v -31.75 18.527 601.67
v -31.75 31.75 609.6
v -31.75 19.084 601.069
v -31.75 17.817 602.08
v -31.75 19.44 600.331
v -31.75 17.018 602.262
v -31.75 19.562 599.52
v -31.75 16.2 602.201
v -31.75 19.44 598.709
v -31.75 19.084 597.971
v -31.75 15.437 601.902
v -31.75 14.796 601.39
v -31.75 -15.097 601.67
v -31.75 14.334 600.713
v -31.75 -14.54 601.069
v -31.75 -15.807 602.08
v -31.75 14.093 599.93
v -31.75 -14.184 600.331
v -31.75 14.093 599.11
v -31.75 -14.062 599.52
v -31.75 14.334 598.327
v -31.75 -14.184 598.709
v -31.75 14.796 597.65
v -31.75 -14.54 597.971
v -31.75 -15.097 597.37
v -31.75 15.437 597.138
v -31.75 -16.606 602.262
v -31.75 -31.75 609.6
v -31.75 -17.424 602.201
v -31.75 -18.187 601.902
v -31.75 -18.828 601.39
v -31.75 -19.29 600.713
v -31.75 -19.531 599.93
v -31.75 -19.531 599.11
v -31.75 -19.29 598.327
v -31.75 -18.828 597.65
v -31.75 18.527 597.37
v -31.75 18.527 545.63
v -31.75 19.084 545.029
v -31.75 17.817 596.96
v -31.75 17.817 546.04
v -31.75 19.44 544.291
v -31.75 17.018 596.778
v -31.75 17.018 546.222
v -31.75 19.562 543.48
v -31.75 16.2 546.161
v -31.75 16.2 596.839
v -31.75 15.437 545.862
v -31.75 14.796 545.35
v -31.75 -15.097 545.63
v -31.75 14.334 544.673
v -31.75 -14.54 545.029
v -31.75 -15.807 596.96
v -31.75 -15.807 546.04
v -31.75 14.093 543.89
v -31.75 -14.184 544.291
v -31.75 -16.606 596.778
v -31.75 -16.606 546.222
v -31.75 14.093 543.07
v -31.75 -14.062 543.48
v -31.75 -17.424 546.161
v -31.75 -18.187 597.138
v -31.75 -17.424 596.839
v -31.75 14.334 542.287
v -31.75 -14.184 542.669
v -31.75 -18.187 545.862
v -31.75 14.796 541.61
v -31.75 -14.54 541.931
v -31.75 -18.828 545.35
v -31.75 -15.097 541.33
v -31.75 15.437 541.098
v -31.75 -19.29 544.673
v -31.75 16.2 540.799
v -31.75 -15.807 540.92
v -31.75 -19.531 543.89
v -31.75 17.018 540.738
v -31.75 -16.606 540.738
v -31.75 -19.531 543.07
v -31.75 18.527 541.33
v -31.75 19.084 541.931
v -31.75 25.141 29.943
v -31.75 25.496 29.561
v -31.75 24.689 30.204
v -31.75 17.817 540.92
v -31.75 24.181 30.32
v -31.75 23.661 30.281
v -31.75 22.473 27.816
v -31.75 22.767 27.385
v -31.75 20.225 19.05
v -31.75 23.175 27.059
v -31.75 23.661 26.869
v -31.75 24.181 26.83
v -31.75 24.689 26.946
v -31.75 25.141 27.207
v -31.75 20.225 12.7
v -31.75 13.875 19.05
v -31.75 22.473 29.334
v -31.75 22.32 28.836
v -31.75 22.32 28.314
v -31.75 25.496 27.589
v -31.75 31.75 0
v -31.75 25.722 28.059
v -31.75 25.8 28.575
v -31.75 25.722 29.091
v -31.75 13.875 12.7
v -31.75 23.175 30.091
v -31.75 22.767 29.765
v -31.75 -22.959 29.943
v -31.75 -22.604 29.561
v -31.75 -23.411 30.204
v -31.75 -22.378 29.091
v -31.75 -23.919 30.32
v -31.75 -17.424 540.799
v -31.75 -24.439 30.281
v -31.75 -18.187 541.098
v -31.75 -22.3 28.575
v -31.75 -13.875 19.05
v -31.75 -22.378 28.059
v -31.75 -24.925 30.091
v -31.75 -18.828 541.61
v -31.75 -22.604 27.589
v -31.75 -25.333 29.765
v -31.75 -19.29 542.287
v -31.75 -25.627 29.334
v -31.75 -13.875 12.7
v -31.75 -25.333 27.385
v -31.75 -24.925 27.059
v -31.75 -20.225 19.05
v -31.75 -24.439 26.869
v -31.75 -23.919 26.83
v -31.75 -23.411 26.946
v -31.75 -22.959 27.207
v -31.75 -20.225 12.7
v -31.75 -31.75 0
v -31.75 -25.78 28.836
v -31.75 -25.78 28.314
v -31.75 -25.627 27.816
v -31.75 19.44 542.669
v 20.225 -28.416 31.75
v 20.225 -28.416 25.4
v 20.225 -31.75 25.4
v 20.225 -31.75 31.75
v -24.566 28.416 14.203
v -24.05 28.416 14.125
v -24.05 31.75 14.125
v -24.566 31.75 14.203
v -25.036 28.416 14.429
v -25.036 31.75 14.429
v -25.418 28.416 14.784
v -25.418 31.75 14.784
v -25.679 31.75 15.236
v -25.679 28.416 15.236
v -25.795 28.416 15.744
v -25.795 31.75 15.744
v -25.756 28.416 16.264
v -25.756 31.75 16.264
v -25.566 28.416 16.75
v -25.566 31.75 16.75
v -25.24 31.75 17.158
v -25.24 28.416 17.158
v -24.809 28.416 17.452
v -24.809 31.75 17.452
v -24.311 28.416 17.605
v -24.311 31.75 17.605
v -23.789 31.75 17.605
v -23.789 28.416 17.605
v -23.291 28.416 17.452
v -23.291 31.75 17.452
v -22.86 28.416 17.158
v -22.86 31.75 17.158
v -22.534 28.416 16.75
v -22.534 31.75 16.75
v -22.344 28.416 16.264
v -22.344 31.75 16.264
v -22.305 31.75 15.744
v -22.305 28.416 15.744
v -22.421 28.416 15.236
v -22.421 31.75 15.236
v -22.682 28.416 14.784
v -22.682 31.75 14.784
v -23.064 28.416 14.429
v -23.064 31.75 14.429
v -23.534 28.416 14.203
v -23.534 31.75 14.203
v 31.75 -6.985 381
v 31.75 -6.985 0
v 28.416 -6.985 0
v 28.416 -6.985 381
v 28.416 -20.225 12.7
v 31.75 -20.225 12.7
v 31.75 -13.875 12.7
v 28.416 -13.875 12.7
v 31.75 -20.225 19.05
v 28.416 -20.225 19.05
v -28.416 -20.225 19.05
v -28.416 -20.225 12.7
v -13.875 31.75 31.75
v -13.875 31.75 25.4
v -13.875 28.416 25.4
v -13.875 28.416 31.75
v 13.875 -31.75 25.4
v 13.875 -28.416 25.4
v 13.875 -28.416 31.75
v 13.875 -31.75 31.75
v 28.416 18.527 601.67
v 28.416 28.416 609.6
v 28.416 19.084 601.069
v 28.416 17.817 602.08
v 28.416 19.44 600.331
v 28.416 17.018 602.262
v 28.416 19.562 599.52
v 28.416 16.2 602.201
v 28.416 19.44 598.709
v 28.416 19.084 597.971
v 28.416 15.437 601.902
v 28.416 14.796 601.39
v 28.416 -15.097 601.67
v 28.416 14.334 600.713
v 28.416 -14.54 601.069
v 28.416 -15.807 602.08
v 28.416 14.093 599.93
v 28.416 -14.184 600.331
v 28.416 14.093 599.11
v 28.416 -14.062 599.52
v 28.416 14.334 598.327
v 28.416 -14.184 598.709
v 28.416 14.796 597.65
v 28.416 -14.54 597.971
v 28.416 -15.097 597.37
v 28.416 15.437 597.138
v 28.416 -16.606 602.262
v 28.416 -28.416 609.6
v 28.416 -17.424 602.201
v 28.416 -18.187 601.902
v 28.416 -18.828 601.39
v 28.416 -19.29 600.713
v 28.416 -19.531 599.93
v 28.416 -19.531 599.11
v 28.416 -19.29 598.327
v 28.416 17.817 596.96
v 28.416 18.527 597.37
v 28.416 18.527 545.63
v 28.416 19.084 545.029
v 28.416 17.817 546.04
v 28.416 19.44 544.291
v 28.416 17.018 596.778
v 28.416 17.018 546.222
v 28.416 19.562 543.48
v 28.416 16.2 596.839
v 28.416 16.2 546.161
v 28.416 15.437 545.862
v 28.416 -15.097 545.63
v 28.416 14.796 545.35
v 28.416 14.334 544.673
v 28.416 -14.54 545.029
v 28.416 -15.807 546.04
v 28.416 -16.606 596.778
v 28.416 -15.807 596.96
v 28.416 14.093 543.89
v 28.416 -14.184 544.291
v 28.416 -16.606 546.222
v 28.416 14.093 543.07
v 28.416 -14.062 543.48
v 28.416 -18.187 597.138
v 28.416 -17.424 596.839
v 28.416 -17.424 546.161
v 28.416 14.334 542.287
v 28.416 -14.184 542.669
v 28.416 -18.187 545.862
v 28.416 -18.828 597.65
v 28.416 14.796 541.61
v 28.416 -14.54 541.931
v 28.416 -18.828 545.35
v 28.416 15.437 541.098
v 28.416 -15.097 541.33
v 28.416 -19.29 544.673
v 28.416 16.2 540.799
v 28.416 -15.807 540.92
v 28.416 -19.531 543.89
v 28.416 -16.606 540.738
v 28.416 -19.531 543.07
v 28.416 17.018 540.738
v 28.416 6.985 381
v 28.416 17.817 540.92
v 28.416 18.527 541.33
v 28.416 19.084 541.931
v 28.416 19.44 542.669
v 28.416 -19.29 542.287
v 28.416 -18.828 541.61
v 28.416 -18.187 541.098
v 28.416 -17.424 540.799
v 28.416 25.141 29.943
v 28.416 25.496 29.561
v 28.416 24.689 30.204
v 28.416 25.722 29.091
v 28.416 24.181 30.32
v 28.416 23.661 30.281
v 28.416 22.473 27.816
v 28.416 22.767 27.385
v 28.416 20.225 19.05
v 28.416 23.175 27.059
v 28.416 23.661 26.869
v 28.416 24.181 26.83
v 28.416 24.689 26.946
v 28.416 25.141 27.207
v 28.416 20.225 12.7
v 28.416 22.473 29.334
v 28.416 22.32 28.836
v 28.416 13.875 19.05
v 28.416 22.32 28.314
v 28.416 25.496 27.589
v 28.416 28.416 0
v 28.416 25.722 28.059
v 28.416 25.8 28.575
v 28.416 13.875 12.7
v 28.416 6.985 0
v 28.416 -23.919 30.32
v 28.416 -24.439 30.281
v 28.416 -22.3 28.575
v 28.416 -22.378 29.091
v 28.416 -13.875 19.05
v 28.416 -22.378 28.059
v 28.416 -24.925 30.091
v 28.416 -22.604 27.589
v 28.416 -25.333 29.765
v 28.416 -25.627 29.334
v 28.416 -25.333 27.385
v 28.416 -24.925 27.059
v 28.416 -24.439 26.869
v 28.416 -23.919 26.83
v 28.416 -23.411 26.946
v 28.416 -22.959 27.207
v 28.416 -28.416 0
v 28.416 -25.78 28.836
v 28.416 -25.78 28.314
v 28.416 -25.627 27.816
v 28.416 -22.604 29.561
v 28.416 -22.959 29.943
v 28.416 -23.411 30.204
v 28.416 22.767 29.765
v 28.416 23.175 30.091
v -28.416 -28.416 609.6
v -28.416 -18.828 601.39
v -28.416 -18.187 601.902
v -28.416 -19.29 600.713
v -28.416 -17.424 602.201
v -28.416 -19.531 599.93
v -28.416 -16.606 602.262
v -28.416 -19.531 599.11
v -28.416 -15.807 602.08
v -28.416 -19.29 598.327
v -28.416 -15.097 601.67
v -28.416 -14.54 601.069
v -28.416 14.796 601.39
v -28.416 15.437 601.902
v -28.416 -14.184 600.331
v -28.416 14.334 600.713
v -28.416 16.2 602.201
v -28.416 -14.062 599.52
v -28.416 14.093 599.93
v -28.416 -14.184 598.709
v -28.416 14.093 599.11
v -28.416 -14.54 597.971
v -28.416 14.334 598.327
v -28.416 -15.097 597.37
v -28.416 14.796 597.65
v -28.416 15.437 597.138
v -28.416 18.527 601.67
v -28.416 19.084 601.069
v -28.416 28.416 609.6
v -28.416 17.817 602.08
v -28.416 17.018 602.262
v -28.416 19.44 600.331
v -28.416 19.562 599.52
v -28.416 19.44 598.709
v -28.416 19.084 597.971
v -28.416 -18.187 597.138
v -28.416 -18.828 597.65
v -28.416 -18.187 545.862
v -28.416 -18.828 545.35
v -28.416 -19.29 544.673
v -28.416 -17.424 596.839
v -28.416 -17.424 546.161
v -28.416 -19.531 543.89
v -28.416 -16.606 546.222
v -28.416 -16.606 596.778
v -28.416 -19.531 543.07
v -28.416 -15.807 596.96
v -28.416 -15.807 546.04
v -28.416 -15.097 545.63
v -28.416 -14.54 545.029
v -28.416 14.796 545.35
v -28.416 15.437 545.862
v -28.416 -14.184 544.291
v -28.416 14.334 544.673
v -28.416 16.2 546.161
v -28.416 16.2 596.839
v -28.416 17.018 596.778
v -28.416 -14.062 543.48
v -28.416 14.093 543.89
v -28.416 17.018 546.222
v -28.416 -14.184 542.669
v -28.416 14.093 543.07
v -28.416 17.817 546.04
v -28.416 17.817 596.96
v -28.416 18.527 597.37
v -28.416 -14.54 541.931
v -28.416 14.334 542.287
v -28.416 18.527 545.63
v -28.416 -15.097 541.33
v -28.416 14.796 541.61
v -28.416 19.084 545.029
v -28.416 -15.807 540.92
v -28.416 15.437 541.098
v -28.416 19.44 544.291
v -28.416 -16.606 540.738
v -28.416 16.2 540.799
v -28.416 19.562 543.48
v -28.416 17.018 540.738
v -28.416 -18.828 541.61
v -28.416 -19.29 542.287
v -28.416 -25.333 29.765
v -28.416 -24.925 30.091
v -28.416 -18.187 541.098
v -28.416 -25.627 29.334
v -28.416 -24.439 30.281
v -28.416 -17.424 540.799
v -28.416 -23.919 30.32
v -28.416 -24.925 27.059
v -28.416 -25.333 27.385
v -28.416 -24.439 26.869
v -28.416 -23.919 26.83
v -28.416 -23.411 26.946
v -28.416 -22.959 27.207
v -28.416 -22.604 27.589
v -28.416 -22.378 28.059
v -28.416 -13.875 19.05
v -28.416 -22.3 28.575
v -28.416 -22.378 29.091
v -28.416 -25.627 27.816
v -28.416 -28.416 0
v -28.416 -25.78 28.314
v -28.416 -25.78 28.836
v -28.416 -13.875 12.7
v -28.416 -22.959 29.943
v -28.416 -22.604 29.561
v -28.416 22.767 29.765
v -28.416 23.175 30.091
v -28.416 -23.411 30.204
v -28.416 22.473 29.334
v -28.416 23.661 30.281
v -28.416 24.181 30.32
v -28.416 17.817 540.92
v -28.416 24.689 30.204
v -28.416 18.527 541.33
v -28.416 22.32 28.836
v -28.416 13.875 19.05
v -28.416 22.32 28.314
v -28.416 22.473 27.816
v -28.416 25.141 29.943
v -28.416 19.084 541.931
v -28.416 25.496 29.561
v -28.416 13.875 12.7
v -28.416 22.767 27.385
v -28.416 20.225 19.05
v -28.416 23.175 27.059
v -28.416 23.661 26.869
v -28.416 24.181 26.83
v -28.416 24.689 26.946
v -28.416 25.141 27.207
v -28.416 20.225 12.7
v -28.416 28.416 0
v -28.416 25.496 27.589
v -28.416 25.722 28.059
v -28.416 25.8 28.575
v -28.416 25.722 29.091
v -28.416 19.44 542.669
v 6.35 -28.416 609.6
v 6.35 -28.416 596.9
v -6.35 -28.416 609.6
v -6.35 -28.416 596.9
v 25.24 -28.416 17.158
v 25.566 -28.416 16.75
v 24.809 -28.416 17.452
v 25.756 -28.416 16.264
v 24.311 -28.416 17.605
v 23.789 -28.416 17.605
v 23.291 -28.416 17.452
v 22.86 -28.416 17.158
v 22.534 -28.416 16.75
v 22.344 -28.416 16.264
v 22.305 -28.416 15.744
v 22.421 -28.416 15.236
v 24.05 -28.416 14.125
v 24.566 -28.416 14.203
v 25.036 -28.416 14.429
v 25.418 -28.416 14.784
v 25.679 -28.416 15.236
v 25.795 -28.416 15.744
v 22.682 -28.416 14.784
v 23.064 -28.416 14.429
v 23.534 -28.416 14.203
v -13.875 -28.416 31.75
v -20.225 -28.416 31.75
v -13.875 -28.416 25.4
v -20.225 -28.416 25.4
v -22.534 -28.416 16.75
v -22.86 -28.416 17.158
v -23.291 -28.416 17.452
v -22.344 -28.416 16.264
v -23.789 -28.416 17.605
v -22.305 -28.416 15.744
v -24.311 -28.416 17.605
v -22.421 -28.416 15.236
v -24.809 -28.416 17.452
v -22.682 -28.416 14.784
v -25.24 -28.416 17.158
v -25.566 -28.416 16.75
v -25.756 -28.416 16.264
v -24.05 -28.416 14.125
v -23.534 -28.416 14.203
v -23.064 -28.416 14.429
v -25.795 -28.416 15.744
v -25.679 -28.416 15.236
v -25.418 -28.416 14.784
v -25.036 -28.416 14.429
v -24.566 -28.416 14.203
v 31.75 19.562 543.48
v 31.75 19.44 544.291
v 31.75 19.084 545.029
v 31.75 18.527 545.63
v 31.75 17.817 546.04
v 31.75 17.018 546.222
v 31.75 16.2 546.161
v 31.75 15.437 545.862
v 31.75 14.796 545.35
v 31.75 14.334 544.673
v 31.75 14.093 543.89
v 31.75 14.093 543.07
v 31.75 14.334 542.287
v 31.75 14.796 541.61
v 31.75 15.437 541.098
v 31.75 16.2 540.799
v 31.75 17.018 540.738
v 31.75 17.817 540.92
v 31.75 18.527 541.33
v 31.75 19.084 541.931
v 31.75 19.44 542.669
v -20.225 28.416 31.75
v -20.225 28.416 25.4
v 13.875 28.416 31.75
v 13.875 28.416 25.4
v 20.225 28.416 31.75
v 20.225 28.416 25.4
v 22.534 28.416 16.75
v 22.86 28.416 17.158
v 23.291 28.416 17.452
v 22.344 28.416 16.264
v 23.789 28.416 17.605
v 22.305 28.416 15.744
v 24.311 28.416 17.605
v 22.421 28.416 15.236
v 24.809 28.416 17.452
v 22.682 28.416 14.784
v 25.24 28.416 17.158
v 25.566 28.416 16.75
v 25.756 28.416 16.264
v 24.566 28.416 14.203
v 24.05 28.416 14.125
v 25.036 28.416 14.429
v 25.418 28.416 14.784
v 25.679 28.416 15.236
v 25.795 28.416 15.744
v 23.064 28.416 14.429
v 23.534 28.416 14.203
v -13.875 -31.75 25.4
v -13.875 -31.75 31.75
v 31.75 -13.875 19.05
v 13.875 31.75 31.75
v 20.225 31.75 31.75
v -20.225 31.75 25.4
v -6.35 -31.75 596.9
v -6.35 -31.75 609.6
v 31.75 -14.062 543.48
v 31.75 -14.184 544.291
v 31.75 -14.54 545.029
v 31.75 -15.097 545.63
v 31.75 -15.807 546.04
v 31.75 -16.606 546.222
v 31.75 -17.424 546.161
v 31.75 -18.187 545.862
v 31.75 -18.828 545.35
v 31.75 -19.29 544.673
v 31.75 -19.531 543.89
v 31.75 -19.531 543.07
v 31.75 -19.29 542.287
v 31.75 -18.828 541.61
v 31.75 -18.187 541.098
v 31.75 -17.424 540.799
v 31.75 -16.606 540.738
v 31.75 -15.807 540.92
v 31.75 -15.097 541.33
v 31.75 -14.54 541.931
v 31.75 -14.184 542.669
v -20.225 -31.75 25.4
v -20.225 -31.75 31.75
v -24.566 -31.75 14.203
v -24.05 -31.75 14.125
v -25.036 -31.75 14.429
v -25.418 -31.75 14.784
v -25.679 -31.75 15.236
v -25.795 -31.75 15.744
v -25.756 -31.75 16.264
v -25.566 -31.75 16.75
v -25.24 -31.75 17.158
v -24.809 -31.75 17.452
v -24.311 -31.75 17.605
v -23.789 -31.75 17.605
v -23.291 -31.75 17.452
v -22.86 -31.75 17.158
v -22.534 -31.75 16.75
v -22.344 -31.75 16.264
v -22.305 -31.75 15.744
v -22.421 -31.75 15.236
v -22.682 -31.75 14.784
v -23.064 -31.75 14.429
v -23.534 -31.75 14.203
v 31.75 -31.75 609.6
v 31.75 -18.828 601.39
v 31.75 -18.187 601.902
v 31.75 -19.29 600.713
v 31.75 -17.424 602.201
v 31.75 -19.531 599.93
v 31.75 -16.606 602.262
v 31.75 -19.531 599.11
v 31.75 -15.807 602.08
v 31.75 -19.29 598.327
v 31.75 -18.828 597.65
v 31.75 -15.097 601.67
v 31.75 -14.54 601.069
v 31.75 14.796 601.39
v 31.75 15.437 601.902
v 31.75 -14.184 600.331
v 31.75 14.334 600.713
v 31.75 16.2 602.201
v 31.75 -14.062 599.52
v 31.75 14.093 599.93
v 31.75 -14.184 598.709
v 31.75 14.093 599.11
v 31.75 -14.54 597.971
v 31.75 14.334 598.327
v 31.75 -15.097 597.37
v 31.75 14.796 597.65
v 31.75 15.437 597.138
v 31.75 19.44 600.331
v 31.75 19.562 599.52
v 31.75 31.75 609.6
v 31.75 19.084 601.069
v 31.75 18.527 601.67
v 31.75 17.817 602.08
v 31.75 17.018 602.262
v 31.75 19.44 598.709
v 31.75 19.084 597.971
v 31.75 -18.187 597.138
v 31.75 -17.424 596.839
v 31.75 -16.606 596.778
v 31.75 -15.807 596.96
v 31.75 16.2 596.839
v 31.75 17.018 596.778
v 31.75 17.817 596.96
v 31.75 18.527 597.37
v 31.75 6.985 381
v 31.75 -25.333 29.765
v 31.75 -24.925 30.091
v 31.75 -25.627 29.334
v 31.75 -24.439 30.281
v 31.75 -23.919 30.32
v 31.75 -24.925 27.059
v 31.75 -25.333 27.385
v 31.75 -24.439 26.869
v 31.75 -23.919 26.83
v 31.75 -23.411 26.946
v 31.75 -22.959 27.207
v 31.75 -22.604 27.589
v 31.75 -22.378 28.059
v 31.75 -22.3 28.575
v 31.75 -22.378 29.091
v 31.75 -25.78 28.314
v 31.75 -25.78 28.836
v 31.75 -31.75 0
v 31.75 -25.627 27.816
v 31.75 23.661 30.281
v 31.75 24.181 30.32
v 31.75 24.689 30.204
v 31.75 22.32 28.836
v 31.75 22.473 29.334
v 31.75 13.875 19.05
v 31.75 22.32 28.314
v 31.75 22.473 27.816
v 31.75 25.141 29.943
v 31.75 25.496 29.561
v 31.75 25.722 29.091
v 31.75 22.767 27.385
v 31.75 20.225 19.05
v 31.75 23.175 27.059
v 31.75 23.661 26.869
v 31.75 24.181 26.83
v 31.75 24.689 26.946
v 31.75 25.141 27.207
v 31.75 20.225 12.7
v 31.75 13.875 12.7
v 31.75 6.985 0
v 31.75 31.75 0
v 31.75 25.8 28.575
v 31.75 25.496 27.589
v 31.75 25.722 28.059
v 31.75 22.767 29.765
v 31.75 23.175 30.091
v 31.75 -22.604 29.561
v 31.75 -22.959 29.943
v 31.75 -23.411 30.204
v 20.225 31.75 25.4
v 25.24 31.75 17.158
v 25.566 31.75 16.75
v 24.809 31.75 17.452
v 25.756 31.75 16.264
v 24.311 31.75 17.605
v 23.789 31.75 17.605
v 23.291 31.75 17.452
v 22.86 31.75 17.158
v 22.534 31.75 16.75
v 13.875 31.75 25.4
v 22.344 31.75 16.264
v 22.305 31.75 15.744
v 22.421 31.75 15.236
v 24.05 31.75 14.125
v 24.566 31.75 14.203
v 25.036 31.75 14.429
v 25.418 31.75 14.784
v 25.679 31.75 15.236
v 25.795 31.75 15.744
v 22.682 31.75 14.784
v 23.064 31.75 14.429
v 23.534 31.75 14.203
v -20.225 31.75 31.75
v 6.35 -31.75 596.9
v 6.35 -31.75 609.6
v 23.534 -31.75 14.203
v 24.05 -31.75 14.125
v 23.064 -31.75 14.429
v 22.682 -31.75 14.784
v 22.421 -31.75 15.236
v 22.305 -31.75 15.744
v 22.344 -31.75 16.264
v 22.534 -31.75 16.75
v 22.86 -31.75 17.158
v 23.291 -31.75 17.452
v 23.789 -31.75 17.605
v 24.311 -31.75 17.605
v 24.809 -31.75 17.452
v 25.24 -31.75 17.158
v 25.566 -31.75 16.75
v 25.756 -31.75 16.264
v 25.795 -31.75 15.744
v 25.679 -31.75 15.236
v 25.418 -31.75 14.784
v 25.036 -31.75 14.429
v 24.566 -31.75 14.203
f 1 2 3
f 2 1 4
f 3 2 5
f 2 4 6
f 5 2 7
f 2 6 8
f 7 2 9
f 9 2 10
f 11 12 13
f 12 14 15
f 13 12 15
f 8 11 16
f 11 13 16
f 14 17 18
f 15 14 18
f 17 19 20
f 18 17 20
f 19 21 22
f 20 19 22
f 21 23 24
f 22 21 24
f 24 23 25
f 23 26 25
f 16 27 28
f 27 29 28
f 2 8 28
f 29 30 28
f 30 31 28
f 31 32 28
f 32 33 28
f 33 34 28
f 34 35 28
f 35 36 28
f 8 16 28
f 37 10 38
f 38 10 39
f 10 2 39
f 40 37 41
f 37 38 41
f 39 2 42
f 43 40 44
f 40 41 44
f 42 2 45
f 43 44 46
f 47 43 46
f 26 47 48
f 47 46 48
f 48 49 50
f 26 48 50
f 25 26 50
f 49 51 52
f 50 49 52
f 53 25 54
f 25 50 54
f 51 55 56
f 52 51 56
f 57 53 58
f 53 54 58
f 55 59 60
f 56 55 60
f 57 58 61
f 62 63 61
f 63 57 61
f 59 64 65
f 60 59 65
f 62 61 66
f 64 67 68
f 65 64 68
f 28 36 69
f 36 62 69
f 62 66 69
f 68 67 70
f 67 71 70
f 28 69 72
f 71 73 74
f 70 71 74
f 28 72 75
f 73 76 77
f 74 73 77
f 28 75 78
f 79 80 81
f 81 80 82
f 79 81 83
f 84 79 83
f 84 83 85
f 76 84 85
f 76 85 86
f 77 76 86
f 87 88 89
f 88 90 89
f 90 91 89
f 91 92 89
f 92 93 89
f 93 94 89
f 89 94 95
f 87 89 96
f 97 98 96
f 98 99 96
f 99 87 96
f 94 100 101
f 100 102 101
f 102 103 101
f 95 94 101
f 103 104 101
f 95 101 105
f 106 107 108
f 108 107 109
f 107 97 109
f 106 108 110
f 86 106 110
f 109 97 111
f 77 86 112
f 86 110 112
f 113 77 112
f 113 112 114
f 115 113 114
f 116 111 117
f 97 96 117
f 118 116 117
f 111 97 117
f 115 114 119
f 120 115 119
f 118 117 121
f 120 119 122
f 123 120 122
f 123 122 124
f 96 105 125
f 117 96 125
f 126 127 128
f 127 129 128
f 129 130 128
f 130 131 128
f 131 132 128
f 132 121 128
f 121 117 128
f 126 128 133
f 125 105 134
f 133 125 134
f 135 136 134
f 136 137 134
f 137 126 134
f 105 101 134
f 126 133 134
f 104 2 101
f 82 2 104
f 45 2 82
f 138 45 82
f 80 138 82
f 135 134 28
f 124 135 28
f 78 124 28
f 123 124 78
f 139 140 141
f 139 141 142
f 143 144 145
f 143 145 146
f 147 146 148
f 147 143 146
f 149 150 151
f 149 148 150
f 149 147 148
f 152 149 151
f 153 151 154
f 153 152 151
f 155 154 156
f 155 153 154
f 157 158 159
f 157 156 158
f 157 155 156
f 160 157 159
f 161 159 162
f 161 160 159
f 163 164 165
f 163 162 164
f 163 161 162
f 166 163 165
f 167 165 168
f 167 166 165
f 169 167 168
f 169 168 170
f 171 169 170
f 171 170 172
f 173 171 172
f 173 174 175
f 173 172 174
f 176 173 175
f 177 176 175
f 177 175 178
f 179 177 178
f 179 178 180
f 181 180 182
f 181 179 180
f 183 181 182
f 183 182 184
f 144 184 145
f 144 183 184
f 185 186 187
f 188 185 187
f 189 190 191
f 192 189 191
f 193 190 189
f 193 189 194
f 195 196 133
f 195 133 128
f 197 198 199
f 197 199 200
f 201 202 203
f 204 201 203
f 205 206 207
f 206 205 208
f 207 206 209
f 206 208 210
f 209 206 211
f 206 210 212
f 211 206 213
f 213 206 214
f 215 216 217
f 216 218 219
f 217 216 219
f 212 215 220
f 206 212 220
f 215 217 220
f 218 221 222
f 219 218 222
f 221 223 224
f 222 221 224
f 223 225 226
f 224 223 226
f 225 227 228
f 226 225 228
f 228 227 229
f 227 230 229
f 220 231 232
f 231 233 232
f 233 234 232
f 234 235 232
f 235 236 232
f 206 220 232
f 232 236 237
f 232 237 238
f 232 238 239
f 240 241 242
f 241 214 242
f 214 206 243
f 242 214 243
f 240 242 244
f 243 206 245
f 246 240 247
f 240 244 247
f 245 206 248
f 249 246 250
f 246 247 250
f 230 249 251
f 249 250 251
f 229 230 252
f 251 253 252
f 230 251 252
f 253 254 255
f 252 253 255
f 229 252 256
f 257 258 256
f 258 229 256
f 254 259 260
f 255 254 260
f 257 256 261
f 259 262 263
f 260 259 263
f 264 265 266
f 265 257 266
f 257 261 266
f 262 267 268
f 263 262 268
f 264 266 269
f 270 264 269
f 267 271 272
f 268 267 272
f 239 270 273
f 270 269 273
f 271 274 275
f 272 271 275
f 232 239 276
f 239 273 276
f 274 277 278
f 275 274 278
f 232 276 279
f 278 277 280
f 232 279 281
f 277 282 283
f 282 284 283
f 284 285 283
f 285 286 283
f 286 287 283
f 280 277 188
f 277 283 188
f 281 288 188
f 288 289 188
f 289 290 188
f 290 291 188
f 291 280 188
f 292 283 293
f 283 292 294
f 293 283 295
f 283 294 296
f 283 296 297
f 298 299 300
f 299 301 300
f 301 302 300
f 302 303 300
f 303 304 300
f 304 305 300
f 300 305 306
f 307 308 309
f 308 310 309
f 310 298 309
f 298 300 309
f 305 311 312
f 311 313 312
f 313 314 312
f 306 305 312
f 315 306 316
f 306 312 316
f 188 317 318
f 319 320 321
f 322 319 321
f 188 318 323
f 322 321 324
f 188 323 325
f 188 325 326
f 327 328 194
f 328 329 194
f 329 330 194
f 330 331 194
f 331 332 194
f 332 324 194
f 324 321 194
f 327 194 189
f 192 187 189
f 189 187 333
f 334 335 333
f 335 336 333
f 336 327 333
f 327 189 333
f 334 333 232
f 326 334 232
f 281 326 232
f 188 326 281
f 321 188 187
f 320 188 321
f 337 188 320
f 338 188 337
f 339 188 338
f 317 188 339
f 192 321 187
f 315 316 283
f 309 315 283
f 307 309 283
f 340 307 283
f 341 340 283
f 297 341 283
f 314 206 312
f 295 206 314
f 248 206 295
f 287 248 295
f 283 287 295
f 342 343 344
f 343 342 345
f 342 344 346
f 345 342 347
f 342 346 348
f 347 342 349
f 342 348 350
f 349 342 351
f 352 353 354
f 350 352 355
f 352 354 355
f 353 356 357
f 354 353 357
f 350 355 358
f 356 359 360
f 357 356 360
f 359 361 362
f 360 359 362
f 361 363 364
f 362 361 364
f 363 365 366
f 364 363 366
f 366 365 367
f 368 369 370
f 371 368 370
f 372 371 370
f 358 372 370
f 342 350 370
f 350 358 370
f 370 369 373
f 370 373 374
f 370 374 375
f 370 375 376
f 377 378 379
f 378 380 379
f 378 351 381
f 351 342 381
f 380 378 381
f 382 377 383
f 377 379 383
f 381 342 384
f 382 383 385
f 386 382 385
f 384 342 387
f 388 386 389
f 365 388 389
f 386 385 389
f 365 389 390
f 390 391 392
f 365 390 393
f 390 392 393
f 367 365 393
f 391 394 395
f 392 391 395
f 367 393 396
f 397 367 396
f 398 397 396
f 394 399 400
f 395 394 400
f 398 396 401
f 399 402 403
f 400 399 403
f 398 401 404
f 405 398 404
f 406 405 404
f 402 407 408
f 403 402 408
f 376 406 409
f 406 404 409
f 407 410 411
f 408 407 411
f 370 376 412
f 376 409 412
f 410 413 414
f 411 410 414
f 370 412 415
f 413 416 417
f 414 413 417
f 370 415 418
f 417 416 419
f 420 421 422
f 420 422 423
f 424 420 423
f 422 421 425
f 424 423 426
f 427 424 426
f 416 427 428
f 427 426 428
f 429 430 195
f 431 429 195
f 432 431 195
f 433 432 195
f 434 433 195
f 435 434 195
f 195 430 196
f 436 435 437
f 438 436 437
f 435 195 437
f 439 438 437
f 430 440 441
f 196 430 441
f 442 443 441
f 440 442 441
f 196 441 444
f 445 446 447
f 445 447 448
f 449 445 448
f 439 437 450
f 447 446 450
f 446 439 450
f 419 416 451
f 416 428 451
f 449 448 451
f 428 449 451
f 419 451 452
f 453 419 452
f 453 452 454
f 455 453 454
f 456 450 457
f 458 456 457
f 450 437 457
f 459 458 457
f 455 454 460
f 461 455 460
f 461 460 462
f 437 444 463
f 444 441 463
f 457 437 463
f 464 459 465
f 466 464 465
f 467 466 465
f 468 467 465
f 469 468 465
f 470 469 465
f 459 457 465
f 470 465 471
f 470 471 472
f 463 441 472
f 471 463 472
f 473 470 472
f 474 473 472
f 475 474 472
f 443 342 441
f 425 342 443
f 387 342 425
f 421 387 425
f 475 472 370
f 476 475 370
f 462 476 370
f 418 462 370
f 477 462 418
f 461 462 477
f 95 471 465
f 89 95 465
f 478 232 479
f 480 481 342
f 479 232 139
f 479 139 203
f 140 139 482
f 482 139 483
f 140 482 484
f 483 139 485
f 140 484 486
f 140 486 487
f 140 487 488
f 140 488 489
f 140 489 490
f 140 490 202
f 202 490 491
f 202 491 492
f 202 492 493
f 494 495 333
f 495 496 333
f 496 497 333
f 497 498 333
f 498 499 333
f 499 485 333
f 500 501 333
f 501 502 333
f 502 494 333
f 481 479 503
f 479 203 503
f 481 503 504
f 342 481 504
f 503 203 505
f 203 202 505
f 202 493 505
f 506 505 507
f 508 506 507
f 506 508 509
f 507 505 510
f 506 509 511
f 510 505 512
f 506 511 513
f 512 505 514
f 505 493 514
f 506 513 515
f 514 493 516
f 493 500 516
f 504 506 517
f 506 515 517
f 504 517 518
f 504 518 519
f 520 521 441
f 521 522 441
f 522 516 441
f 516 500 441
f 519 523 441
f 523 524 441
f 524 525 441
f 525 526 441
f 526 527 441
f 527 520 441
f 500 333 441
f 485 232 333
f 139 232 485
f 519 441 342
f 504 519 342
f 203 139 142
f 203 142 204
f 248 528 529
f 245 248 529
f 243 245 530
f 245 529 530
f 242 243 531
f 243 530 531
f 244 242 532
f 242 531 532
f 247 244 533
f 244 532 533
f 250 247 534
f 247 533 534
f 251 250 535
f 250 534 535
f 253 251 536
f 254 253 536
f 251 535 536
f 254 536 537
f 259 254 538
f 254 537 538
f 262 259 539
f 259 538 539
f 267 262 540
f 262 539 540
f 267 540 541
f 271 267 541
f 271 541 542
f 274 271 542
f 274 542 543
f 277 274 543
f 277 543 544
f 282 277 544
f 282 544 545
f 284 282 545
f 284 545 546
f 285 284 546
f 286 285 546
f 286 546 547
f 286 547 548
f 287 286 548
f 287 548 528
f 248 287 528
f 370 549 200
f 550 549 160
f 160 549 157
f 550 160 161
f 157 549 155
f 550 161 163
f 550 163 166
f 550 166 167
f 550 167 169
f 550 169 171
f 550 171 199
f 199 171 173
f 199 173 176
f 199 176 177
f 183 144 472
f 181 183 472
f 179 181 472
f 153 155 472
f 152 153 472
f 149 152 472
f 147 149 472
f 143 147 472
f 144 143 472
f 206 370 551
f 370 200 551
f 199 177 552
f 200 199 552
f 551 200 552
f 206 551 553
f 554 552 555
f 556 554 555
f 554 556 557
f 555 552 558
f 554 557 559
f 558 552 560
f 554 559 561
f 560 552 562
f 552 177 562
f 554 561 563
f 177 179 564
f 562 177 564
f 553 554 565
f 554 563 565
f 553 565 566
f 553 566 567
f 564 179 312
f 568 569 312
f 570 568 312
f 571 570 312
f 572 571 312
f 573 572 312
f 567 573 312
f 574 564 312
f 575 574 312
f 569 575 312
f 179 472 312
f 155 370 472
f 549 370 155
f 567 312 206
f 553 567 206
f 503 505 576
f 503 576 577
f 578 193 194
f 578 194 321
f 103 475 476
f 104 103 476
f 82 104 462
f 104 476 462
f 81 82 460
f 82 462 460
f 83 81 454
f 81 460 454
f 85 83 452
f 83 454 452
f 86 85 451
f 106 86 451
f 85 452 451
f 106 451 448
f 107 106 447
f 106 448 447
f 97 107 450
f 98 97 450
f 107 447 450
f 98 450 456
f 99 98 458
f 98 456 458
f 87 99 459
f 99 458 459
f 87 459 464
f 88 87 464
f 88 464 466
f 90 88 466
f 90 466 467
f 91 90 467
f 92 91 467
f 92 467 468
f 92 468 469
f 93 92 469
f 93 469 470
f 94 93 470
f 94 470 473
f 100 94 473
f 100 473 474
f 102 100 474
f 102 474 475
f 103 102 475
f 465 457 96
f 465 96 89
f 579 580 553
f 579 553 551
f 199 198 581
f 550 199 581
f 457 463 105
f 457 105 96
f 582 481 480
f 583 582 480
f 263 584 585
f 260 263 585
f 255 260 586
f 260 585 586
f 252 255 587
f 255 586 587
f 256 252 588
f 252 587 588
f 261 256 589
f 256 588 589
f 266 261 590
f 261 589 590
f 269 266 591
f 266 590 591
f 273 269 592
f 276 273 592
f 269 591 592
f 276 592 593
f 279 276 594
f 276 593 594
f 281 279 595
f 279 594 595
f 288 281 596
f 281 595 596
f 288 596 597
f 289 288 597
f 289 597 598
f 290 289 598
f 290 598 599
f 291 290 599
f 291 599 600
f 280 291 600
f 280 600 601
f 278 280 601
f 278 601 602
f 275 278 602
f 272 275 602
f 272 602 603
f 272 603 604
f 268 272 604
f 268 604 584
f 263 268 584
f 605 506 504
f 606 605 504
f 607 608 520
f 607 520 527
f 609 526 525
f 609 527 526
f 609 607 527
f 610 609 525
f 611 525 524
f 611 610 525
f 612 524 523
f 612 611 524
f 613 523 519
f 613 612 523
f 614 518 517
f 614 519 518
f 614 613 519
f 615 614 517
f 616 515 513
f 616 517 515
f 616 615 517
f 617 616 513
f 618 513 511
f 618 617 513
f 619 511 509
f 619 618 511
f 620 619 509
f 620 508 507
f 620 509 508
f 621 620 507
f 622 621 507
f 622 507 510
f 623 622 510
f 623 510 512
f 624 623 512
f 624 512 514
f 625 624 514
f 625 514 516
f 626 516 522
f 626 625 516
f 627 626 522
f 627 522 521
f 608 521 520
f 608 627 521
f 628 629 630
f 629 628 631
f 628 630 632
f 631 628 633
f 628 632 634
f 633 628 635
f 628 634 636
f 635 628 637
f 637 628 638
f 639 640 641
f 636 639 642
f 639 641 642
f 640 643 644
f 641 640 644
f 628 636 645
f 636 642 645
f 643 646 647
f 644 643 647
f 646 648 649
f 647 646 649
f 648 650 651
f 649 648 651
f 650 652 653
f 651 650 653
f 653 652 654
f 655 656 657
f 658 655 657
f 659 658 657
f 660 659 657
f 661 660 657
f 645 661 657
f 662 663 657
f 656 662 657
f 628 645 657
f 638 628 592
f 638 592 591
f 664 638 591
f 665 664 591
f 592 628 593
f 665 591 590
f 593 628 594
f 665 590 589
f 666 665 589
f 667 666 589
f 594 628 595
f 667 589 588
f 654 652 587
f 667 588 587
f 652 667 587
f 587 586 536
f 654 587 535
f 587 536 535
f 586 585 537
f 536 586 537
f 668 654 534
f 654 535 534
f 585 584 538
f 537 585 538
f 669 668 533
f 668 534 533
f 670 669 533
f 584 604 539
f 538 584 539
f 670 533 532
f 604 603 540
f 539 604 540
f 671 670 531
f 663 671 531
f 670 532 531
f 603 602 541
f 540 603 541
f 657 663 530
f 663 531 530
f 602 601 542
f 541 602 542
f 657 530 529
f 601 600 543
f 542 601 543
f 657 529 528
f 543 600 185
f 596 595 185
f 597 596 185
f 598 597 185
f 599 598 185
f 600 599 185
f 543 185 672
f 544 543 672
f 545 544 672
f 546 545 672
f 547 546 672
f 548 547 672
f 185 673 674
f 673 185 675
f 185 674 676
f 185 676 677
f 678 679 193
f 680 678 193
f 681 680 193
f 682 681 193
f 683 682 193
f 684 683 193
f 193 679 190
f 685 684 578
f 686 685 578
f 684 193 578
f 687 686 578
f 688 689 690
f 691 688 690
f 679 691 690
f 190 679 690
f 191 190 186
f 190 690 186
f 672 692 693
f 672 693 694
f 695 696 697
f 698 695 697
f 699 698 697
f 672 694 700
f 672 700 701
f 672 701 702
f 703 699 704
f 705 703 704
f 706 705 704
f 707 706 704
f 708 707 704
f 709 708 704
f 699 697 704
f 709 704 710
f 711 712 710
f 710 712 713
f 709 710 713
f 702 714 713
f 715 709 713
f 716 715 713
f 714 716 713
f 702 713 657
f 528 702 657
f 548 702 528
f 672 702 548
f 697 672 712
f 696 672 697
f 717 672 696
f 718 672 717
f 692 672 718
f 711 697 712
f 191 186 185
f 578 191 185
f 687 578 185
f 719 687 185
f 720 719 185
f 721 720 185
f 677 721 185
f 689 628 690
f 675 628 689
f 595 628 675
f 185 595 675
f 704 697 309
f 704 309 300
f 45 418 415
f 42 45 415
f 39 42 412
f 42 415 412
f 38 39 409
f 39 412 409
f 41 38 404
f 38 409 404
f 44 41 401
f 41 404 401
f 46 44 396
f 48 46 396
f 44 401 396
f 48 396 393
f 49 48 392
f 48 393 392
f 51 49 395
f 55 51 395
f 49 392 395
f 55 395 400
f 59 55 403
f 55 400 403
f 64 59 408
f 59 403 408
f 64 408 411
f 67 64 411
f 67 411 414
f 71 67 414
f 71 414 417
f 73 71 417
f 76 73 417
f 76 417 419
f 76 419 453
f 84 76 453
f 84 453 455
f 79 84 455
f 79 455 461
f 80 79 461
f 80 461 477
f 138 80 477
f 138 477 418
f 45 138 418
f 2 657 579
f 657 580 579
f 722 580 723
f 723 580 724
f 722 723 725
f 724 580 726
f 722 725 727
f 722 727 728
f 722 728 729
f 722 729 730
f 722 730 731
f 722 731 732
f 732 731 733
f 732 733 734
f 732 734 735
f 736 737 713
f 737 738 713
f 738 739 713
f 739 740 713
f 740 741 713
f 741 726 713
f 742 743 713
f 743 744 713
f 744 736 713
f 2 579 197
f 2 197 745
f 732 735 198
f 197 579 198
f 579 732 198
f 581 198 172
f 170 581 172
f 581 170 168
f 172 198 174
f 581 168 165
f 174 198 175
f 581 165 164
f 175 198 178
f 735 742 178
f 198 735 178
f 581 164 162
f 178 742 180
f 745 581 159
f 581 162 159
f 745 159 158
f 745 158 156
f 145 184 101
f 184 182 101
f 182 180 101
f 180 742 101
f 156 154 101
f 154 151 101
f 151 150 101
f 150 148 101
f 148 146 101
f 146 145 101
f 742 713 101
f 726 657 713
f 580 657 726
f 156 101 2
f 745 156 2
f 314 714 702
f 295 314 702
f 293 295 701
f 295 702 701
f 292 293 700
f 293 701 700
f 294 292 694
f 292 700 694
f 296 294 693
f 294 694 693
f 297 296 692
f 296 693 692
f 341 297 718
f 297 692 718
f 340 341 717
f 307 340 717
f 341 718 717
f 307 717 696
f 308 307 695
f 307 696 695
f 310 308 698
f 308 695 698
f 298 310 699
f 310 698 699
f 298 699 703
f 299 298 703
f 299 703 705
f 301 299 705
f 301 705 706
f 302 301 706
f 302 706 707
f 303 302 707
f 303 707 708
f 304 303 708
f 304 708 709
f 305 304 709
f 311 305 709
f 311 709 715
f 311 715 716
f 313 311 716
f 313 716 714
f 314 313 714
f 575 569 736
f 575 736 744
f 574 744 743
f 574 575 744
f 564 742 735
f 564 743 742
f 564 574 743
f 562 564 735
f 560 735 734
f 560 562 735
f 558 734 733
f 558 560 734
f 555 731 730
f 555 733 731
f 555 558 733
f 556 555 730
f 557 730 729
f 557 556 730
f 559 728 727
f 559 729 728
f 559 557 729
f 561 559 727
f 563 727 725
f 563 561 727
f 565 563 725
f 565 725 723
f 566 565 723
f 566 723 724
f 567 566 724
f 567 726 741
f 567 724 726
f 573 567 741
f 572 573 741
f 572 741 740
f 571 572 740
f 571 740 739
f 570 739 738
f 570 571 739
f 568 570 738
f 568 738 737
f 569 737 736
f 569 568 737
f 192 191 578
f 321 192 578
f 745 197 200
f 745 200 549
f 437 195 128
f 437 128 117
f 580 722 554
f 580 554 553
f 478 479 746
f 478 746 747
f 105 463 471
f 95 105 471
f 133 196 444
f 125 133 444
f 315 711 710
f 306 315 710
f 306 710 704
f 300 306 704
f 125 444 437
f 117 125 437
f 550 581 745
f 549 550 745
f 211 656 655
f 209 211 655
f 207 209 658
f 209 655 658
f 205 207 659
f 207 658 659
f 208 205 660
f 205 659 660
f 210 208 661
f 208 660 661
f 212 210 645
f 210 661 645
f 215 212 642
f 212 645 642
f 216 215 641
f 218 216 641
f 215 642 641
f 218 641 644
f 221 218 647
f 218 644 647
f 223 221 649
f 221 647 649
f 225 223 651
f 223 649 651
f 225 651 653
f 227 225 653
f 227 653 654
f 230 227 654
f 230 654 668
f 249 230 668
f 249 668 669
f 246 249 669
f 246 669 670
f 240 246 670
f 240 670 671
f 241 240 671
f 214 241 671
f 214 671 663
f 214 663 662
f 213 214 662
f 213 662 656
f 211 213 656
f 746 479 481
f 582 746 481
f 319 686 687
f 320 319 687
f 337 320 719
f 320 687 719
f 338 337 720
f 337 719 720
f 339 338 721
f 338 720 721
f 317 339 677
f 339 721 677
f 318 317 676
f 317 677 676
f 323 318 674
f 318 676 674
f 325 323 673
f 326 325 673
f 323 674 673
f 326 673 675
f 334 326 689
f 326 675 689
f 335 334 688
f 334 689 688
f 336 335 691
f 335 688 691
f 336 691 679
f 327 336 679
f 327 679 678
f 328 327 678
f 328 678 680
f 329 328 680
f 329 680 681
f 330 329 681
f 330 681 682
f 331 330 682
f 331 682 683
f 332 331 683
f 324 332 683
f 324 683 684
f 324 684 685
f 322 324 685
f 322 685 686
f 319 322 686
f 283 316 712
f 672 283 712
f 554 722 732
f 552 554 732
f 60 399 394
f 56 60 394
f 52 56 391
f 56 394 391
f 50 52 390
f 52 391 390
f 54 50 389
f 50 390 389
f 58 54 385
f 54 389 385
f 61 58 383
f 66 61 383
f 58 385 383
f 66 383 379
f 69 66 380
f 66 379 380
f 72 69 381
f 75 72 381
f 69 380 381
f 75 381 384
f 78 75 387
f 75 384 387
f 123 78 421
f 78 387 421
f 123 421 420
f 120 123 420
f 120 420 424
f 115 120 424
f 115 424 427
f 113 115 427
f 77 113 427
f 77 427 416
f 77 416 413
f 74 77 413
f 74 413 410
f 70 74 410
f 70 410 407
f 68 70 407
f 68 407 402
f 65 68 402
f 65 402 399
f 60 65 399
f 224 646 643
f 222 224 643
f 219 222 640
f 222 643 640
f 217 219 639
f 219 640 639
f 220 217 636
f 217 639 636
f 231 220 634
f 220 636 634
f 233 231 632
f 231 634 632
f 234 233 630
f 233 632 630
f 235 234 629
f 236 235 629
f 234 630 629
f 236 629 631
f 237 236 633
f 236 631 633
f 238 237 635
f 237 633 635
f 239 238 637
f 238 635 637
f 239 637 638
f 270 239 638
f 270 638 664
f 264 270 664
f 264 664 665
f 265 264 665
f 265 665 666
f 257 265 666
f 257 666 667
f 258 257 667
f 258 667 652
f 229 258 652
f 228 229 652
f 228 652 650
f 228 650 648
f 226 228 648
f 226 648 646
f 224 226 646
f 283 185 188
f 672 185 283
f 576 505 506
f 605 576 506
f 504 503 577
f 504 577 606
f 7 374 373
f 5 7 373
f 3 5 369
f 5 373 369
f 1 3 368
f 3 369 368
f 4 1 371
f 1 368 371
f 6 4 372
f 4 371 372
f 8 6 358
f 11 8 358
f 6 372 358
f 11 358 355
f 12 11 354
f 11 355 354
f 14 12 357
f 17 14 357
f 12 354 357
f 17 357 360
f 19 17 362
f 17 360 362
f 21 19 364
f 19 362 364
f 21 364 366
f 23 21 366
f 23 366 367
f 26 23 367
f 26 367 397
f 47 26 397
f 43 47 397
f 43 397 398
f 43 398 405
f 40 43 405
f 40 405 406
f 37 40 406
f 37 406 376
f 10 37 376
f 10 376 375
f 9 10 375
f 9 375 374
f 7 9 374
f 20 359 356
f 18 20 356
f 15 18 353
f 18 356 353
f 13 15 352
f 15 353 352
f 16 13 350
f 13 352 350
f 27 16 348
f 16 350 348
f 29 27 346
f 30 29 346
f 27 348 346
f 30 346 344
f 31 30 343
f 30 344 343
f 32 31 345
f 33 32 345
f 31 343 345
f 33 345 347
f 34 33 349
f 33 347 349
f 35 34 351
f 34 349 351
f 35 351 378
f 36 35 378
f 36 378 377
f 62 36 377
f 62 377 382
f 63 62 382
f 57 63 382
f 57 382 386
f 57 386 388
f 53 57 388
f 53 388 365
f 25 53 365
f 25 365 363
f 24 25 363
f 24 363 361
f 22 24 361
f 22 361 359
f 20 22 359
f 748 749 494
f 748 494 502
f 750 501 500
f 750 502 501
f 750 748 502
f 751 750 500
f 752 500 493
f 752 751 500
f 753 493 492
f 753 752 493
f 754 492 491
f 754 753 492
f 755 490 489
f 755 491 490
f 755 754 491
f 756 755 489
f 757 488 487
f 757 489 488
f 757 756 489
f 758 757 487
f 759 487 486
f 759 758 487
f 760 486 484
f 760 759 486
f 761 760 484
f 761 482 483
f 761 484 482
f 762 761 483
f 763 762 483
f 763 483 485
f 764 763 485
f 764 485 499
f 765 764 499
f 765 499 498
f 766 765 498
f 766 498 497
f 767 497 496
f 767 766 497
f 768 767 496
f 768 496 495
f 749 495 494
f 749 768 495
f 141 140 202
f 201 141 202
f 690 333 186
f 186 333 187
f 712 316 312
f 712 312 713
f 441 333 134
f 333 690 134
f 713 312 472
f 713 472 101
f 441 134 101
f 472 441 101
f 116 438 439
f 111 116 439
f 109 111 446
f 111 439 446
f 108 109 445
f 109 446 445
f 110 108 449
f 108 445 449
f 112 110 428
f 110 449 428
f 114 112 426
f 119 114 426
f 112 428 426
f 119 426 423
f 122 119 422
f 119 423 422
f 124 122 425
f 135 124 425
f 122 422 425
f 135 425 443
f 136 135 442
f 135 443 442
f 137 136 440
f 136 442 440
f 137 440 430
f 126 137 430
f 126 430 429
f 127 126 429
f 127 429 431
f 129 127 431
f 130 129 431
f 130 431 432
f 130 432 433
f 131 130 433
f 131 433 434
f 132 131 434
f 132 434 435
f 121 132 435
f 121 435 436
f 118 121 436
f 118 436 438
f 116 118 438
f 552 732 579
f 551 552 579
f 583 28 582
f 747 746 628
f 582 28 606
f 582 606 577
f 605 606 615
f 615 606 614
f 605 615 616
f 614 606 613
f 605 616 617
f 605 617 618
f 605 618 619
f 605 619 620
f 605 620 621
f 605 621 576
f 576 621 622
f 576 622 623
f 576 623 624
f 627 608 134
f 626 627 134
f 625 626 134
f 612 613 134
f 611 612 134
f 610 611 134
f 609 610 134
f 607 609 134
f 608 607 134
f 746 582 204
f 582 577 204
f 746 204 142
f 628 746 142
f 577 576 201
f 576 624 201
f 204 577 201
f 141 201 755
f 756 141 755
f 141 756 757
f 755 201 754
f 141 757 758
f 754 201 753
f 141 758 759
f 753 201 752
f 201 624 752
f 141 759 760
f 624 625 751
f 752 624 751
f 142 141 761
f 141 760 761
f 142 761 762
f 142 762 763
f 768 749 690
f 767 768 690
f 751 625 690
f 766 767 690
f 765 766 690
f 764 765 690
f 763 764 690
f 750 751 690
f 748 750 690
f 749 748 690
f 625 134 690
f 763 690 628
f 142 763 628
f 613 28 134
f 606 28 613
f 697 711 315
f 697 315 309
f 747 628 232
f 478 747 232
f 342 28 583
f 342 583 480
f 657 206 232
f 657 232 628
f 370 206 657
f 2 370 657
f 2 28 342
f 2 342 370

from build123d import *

# Parameters (mm, degrees)
BOSS_EXTRUDE1_DEPTH     = 609.6
CUT_EXTRUDE1_DEPTH      = 254
CUT_EXTRUDE1_DEPTH_BACK = 254
SKETCH2_R               = 1.75
SKETCH4_R               = 1.75
CUT_EXTRUDE2_DEPTH      = 254
SKETCH6_W               = 6.35
SKETCH6_H               = 6.35
CUT_EXTRUDE4_DEPTH      = 90.678
SKETCH7_W               = 6.35
SKETCH7_H               = 6.35
CUT_EXTRUDE5_DEPTH      = 122.174
SKETCH8_W               = 63.5
SKETCH8_H               = 228.6
BOSS_EXTRUDE2_DEPTH     = 3.33375
SKETCH9_R               = 2.75
CUT_EXTRUDE6_DEPTH      = 100.584
SKETCH11_W              = 12.7
SKETCH11_H              = 12.7
CUT_EXTRUDE8_DEPTH      = 31.496


with BuildPart() as part:
    # Sketch1 → Boss-Extrude1 (new body)
    with BuildSketch(Plane(origin=(0, 0, 0), x_dir=(0, 1, 0), z_dir=(0, 0, 1))):
        Polygon((28.41625, 28.41625), (28.41625, -28.41625), (6.985, -28.41625), (6.985, -31.75), (31.75, -31.75), (31.75, 31.75), (-31.75, 31.75), (-31.75, -31.75), (-6.985, -31.75), (-6.985, -28.41625), (-28.41625, -28.41625), (-28.41625, 28.41625), align=None)
    extrude(amount=BOSS_EXTRUDE1_DEPTH)

    # Sketch2 → Cut-Extrude1 (cut, two sides: drawn at the far end of the back side and taken through both)
    with BuildSketch(Plane(origin=(0, 0, 0), x_dir=(-1, 0, 0), z_dir=(0, 1, 0)).offset(-CUT_EXTRUDE1_DEPTH_BACK)):
        with Locations(Location((-24.05, 15.875, 0), (0, 0, 270))):
            Circle(SKETCH2_R)
        with Locations(Location((24.05, 15.875, 0), (0, 0, 270))):
            Circle(SKETCH2_R)
    extrude(amount=CUT_EXTRUDE1_DEPTH + CUT_EXTRUDE1_DEPTH_BACK, mode=Mode.SUBTRACT)

    # Sketch4 → Cut-Extrude2 (cut)
    with BuildSketch(Plane.YZ.offset(31.75)):
        with Locations((24.05, 28.575)):
            Circle(SKETCH4_R)
        with Locations((-24.05, 28.575)):
            Circle(SKETCH4_R)
    extrude(amount=-CUT_EXTRUDE2_DEPTH, mode=Mode.SUBTRACT)

    # Sketch6 → Cut-Extrude4 (cut)
    with BuildSketch(Plane.YZ.offset(31.75)):
        with Locations((17.05, 15.875)):
            Rectangle(SKETCH6_W, SKETCH6_H)
        with Locations((-17.05, 15.875)):
            Rectangle(SKETCH6_W, SKETCH6_H)
    extrude(amount=-CUT_EXTRUDE4_DEPTH, mode=Mode.SUBTRACT)

    # Sketch7 → Cut-Extrude5 (cut)
    with BuildSketch(Plane(origin=(0, 31.75, 0), x_dir=(-1, 0, 0), z_dir=(0, 1, 0))):
        with Locations((-17.05, 28.575)):
            Rectangle(SKETCH7_W, SKETCH7_H)
        with Locations((17.05, 28.575)):
            Rectangle(SKETCH7_W, SKETCH7_H)
    extrude(amount=-CUT_EXTRUDE5_DEPTH, mode=Mode.SUBTRACT)

    # Sketch8 → Boss-Extrude2 (add)
    with BuildSketch(Plane.YZ.offset(31.75)):
        with Locations((0, 495.3)):
            Rectangle(SKETCH8_W, SKETCH8_H)
    extrude(amount=-BOSS_EXTRUDE2_DEPTH)

    # Sketch9 → Cut-Extrude6 (cut)
    with BuildSketch(Plane.YZ.offset(31.75)):
        with Locations((-16.812006, 599.52001)):
            Circle(SKETCH9_R)
        with Locations((-16.812006, 543.47999)):
            Circle(SKETCH9_R)
        with Locations((16.812006, 543.47999)):
            Circle(SKETCH9_R)
        with Locations((16.812006, 599.52001)):
            Circle(SKETCH9_R)
    extrude(amount=-CUT_EXTRUDE6_DEPTH, mode=Mode.SUBTRACT)

    # Sketch11 → Cut-Extrude8 (cut)
    with BuildSketch(Plane(origin=(0, -28.41625, 0), x_dir=(-1, 0, 0), z_dir=(0, 1, 0))):
        with Locations((0, 603.25)):
            Rectangle(SKETCH11_W, SKETCH11_H)
    extrude(amount=-CUT_EXTRUDE8_DEPTH, mode=Mode.SUBTRACT)


solid = part.part
